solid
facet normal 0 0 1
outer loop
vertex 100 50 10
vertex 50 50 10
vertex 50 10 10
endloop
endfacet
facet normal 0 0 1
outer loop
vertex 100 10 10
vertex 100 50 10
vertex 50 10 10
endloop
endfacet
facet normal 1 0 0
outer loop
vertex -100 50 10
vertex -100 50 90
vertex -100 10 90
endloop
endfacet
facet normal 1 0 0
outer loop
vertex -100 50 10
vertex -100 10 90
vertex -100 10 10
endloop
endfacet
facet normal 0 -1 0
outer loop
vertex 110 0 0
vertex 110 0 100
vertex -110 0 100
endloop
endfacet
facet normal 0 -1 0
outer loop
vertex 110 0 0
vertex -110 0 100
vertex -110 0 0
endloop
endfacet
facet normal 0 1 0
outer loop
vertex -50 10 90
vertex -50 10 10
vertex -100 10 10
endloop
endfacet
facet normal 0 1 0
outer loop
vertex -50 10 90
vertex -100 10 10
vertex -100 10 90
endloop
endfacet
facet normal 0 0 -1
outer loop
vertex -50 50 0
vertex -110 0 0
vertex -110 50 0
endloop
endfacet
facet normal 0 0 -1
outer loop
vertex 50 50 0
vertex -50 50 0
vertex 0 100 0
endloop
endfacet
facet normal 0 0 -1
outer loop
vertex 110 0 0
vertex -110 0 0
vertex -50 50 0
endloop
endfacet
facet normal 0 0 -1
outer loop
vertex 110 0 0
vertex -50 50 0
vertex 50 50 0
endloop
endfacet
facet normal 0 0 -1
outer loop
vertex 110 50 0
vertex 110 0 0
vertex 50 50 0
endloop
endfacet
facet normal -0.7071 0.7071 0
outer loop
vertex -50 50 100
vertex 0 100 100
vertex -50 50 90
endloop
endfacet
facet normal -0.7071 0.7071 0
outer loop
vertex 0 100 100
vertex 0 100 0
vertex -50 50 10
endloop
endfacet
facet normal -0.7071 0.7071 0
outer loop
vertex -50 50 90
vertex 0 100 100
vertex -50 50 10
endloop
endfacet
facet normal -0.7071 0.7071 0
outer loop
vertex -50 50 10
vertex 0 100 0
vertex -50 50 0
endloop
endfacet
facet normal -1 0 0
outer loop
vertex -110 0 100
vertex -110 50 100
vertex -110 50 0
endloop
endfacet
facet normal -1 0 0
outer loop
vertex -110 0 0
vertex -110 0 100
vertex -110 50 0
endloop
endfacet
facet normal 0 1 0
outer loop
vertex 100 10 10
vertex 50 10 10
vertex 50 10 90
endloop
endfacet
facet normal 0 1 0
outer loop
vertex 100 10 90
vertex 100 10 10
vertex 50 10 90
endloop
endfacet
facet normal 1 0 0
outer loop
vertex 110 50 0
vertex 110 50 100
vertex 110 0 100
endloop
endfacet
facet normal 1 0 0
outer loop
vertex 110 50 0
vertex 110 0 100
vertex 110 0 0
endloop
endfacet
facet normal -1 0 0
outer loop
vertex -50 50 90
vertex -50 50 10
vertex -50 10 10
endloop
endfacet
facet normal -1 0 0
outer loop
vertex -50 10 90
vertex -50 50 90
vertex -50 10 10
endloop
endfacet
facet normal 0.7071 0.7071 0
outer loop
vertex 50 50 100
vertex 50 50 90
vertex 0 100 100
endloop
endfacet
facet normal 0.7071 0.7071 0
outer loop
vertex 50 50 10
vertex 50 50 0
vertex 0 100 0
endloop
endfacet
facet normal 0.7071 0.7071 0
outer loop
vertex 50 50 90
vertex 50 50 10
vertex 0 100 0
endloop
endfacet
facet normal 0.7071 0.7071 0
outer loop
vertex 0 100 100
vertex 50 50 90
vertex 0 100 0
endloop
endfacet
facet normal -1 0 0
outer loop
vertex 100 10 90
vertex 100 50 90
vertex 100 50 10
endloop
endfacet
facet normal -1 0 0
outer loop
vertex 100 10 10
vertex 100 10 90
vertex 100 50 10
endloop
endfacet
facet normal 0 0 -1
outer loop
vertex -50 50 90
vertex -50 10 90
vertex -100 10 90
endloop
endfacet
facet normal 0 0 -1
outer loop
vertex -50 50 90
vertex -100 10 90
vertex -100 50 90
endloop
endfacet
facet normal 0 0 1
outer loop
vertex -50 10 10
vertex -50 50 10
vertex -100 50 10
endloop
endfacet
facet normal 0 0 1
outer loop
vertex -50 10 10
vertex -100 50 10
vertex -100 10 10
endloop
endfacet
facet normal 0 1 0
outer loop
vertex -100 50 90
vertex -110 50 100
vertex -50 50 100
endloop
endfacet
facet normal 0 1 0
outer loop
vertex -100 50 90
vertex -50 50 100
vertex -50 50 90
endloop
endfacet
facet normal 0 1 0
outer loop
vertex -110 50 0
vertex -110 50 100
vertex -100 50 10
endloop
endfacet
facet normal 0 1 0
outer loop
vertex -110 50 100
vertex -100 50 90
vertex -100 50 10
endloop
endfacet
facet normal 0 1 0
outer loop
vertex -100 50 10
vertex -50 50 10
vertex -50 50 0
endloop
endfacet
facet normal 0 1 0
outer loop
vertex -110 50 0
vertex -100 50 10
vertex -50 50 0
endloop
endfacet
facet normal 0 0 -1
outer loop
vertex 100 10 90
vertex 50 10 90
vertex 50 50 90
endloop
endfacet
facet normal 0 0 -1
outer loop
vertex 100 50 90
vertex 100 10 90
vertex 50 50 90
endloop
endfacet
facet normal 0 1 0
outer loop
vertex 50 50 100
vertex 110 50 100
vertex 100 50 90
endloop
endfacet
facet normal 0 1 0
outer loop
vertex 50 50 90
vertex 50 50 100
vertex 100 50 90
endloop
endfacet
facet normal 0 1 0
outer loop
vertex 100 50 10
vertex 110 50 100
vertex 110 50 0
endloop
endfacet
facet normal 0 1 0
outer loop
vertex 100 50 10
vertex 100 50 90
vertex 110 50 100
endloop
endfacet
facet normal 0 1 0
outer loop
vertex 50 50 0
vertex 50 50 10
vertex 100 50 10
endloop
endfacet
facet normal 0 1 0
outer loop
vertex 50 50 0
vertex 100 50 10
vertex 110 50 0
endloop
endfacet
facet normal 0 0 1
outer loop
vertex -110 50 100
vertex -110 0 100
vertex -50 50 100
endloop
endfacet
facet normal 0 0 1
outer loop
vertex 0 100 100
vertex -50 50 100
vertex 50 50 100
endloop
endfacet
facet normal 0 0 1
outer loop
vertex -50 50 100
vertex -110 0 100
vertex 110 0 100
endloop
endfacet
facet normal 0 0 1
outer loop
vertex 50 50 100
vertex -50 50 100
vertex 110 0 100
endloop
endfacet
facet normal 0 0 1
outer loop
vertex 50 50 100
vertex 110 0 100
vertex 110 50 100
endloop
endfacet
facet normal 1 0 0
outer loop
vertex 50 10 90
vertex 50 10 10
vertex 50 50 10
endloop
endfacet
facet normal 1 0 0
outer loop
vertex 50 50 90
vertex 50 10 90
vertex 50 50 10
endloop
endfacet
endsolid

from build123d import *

# Parameters (mm, degrees)
BOSS_EXTRUDE1_DEPTH = 100
BOSS_EXTRUDE2_DEPTH = 50
SKETCH5_W           = 100
SKETCH5_H           = 50
BOSS_EXTRUDE3_DEPTH = 10


with BuildPart() as part:
    # Sketch2 → Boss-Extrude1 (new body)
    with BuildSketch(Plane.XY):
        Polygon((-50, 0), (50, 0), (50, 50), (0, 100), (-50, 50), align=None)
    extrude(amount=BOSS_EXTRUDE1_DEPTH)

    # Sketch4 → Boss-Extrude2 (add)
    with BuildSketch(Plane(origin=(50, 0, 0), x_dir=(0, 0, -1), z_dir=(1, 0, 0))):
        Polygon((-100, 50), (-100, 0), (0, 0), (0, 50), (-10, 50), (-10, 10), (-90, 10), (-90, 50), align=None)
    boss_extrude2 = extrude(amount=BOSS_EXTRUDE2_DEPTH)

    # Sketch5 → Boss-Extrude3 (add)
    with BuildSketch(Plane(origin=(100, 0, 0), x_dir=(0, 0, -1), z_dir=(1, 0, 0))):
        with Locations((-50, 25)):
            Rectangle(SKETCH5_W, SKETCH5_H)
    boss_extrude3 = extrude(amount=BOSS_EXTRUDE3_DEPTH)

    # Mirror1: Boss-Extrude2, Boss-Extrude3 across plane
    add(boss_extrude2.mirror(Plane(origin=(0, 0, 0), x_dir=(0, 0, 1), z_dir=(1, 0, 0))))
    add(boss_extrude3.mirror(Plane(origin=(0, 0, 0), x_dir=(0, 0, 1), z_dir=(1, 0, 0))))


solid = part.part
